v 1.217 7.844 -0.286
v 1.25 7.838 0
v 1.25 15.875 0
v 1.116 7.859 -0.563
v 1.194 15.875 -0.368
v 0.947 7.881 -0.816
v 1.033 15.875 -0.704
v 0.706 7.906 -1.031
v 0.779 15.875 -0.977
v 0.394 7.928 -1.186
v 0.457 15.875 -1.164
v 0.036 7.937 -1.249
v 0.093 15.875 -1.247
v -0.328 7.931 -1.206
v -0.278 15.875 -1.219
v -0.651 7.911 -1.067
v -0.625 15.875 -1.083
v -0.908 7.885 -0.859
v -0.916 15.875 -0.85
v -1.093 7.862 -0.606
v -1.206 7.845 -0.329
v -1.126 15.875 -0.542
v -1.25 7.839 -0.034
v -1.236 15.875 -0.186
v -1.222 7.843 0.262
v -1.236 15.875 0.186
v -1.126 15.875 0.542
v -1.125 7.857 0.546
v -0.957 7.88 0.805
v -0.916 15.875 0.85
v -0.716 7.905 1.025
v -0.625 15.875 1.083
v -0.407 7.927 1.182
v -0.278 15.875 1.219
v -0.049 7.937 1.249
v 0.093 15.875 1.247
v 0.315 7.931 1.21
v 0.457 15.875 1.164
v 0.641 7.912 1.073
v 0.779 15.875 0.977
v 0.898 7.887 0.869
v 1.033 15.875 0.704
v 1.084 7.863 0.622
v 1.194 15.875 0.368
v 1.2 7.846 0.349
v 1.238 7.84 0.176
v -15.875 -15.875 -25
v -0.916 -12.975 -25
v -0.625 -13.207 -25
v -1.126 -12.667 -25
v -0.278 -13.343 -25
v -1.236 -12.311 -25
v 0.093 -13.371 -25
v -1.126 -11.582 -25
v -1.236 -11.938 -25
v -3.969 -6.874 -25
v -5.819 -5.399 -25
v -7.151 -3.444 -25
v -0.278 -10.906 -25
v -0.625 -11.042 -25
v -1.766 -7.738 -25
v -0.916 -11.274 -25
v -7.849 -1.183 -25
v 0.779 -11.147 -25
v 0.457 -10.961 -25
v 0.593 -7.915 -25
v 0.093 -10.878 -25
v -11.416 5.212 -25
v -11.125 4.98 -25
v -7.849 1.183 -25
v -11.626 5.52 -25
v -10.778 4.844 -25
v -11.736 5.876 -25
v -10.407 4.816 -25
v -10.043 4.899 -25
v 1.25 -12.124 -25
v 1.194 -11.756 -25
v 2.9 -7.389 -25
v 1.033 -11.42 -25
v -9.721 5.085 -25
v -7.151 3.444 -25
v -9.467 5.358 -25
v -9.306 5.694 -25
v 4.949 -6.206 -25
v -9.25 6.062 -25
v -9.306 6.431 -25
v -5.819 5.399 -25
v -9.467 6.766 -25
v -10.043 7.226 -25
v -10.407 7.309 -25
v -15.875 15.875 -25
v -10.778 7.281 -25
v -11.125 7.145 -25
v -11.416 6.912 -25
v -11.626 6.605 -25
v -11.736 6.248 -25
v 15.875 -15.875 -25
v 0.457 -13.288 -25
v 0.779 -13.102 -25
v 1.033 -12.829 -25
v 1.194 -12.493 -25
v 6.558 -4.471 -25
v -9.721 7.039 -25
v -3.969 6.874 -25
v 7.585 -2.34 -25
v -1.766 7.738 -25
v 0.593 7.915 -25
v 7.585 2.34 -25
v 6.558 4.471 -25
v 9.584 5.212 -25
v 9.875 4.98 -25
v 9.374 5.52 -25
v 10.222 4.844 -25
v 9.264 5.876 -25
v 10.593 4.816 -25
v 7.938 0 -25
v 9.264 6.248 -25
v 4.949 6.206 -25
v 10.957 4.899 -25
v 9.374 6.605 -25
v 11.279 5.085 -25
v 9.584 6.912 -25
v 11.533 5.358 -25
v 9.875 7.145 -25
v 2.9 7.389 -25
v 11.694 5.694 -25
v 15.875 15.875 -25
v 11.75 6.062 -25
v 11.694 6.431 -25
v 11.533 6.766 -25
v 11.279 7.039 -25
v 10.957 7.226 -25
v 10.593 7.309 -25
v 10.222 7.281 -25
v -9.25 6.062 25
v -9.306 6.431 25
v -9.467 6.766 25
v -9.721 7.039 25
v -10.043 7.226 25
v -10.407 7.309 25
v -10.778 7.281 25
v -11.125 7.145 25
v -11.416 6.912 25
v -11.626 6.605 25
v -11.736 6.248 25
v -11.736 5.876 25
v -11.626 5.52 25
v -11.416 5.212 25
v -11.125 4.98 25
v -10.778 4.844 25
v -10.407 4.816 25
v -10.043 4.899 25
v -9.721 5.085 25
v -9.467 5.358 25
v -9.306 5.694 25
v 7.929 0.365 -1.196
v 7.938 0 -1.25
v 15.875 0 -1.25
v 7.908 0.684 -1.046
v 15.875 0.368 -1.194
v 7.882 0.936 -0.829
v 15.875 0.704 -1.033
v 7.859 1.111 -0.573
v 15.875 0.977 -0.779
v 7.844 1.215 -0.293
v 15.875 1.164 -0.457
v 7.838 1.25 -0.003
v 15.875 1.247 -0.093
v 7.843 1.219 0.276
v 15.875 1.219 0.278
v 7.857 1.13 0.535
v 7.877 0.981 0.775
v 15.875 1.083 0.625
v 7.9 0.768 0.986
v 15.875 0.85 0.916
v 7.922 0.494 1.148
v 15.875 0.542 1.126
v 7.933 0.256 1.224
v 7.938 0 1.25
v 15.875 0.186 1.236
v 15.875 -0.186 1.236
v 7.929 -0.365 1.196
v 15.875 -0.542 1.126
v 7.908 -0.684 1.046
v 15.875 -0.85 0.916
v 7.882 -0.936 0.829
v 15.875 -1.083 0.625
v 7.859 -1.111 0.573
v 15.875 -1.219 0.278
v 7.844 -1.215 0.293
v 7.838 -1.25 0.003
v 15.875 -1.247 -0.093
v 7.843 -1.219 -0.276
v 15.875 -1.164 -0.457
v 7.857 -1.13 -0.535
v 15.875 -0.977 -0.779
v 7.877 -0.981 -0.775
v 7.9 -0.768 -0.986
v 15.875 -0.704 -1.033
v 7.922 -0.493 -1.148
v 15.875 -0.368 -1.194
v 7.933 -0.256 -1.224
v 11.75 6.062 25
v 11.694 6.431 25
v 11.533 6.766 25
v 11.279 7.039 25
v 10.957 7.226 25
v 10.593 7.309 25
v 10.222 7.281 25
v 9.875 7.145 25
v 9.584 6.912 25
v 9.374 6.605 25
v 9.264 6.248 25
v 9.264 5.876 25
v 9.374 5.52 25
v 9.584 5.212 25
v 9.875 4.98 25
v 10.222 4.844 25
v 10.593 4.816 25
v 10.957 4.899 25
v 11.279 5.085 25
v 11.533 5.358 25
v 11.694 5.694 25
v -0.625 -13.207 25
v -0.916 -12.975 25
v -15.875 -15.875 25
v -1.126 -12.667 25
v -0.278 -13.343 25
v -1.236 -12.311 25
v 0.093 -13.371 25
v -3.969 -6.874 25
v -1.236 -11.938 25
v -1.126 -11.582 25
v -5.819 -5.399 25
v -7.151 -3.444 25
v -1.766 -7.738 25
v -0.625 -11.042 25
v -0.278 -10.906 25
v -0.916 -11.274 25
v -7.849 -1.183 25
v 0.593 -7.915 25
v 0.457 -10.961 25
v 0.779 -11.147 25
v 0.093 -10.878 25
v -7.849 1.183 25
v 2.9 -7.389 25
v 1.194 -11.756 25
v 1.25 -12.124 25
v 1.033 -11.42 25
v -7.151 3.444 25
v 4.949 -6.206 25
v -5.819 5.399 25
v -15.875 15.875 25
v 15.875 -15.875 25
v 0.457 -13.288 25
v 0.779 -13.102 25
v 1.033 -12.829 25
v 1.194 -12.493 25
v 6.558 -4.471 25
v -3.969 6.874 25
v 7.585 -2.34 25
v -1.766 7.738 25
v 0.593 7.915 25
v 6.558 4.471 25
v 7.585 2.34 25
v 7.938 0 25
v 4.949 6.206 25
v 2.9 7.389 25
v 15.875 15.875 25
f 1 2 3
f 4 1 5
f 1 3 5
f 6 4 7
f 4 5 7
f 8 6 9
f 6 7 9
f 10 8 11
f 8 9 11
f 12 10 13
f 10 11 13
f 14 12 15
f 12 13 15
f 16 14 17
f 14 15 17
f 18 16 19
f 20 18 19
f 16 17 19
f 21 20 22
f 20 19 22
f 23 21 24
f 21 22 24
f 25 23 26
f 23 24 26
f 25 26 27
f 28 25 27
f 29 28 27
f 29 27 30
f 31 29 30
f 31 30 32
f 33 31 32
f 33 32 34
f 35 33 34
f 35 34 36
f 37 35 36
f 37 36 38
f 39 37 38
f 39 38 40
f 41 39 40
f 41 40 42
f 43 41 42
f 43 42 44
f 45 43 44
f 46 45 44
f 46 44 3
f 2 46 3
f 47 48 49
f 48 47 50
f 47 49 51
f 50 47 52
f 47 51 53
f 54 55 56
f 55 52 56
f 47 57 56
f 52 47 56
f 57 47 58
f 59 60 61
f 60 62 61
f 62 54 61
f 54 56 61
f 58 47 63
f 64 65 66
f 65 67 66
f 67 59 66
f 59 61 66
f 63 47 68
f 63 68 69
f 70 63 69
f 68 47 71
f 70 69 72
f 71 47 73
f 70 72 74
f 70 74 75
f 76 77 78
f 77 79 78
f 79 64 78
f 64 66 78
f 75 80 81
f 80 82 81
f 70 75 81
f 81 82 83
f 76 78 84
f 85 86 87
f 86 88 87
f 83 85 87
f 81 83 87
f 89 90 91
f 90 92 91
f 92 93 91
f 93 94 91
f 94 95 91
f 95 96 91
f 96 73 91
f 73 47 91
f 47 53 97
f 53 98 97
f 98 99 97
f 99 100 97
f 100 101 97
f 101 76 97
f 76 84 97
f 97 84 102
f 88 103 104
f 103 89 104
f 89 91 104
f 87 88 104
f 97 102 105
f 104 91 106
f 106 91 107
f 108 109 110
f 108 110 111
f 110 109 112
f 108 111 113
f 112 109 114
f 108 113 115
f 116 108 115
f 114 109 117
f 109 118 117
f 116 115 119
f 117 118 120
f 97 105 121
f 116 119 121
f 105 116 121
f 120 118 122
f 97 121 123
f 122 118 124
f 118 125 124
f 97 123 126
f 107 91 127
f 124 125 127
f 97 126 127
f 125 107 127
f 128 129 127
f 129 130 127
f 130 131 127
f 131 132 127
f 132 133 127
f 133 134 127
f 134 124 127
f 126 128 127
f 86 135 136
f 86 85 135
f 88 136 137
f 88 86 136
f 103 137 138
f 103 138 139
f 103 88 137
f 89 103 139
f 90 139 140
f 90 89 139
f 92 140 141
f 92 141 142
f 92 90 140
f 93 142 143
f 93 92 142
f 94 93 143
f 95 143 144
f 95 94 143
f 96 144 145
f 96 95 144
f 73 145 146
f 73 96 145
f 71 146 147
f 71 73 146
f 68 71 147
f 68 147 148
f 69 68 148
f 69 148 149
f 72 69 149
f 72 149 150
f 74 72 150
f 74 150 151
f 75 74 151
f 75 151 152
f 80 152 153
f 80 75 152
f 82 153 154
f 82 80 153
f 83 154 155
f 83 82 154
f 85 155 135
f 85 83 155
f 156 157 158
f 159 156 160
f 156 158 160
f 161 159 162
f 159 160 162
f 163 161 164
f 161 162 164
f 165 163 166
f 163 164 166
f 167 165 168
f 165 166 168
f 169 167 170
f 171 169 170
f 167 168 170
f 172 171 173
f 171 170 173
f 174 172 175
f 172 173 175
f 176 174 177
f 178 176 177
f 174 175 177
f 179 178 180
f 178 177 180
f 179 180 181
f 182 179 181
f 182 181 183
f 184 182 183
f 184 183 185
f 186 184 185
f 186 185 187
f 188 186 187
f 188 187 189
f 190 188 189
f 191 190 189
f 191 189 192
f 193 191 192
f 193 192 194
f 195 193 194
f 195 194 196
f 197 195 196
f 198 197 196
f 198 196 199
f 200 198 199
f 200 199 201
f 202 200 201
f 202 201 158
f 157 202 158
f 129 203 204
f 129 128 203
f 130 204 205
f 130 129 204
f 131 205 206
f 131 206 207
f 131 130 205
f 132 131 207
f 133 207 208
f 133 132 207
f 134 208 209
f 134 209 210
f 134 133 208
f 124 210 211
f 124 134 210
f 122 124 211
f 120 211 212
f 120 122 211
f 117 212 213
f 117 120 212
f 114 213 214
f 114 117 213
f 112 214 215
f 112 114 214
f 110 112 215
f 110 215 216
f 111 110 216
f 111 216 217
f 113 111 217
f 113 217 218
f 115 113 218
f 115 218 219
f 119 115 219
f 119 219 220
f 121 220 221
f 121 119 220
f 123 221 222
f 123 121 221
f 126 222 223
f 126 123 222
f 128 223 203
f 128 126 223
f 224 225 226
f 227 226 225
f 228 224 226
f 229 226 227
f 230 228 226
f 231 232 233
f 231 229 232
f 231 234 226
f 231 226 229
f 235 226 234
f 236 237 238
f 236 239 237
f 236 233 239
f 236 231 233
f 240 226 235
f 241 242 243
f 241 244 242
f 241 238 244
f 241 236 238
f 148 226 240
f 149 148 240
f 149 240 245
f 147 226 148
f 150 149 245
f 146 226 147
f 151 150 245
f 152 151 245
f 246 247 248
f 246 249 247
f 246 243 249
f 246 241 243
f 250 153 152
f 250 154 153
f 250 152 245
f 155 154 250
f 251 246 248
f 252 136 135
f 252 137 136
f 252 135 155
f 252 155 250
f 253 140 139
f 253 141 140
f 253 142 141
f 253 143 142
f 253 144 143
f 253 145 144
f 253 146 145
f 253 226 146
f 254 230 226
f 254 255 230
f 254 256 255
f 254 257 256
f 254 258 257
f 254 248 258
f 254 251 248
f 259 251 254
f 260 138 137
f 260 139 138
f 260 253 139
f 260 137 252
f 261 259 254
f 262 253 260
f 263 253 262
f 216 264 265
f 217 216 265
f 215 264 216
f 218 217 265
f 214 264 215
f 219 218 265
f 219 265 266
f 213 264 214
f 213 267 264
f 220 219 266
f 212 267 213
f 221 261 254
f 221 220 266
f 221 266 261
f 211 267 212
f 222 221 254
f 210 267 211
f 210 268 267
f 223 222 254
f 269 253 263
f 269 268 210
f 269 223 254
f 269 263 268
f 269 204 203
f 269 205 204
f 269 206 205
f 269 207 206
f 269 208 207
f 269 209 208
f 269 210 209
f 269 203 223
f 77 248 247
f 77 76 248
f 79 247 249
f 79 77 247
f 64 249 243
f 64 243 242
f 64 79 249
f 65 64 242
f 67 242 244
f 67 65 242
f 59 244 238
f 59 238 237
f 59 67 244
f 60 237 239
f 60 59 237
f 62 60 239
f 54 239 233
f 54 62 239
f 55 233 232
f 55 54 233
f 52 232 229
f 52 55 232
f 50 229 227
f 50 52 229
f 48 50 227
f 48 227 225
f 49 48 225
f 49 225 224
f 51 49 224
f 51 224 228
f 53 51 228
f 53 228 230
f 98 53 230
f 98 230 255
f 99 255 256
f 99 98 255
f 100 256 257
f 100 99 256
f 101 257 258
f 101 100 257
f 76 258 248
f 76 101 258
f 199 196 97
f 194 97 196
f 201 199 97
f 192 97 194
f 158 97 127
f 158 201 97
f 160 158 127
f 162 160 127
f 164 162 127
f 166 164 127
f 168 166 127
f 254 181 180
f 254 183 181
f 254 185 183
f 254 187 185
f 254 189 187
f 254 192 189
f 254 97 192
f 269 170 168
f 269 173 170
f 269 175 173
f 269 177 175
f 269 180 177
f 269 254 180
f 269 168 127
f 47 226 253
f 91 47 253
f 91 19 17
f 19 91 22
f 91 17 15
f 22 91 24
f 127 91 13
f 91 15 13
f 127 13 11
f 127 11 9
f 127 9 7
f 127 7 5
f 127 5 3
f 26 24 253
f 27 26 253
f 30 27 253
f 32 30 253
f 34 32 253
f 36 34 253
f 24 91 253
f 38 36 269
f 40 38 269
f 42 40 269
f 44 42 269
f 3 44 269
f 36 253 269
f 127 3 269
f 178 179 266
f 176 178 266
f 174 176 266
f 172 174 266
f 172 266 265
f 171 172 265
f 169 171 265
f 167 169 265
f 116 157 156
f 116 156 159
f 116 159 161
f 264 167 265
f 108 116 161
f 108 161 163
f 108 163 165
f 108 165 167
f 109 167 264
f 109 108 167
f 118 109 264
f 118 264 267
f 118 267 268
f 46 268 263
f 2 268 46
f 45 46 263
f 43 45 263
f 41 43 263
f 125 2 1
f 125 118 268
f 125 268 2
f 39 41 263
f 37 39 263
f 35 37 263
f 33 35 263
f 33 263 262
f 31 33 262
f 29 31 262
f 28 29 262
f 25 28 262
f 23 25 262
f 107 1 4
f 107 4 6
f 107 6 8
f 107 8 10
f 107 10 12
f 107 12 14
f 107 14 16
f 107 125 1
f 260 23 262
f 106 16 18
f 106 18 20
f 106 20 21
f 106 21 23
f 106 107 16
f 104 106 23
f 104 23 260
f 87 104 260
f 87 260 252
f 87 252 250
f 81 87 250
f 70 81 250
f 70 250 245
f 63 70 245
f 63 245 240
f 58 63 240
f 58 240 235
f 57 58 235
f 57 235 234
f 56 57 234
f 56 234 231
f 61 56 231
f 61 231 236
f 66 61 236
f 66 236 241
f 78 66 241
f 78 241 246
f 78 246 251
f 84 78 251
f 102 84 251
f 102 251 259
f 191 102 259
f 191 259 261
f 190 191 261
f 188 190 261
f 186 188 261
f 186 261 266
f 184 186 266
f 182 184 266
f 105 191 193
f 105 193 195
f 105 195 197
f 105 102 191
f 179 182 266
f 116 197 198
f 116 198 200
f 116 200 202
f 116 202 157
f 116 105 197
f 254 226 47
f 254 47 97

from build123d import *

# Parameters (mm, degrees)
SKETCH1_W                  = 31.75
SKETCH1_H                  = 31.75
SKETCH1_R                  = 7.9375
SKETCH1_R_2                = 1.25
BOSS_EXTRUDE1_DEPTH        = 25
M3X0_5_TAPPED_HOLE1_REACH  = 45.417
M3X0_5_TAPPED_HOLE1_BORE_R = 1.25
M3X0_5_TAPPED_HOLE2_REACH  = 45.417
M3X0_5_TAPPED_HOLE2_BORE_R = 1.25


with BuildPart() as part:
    # Sketch1 → Boss-Extrude1 (new, symmetric)
    with BuildSketch(Plane.XY):
        Rectangle(SKETCH1_W, SKETCH1_H)
        Circle(SKETCH1_R, mode=Mode.SUBTRACT)
        with Locations((-10.5, 6.062177826)):
            Circle(SKETCH1_R_2, mode=Mode.SUBTRACT)
        with Locations((10.5, 6.062177826)):
            Circle(SKETCH1_R_2, mode=Mode.SUBTRACT)
        with Locations((0, -12.124355653)):
            Circle(SKETCH1_R_2, mode=Mode.SUBTRACT)
    extrude(amount=BOSS_EXTRUDE1_DEPTH, both=True)

    # M3x0.5 Tapped Hole1 bore → M3x0.5 Tapped Hole1 (cut, up to next)
    with BuildSketch(Plane(origin=(0, 15.875, 0), x_dir=(1, 0, 0), z_dir=(0, 1, 0)), mode=Mode.PRIVATE) as m3x0_5_tapped_hole1_sk1:
        Circle(M3X0_5_TAPPED_HOLE1_BORE_R)
    m3x0_5_tapped_hole1_tool1 = extrude(m3x0_5_tapped_hole1_sk1.sketch, amount=-M3X0_5_TAPPED_HOLE1_REACH, mode=Mode.PRIVATE) & part.part
    add(m3x0_5_tapped_hole1_tool1.solids().sort_by_distance((0, 15.875, 0))[0], mode=Mode.SUBTRACT)

    # M3x0.5 Tapped Hole2 bore → M3x0.5 Tapped Hole2 (cut, up to next)
    with BuildSketch(Plane(origin=(15.875, 0, 0), x_dir=(0, 0, -1), z_dir=(1, 0, 0)), mode=Mode.PRIVATE) as m3x0_5_tapped_hole2_sk1:
        Circle(M3X0_5_TAPPED_HOLE2_BORE_R)
    m3x0_5_tapped_hole2_tool1 = extrude(m3x0_5_tapped_hole2_sk1.sketch, amount=-M3X0_5_TAPPED_HOLE2_REACH, mode=Mode.PRIVATE) & part.part
    add(m3x0_5_tapped_hole2_tool1.solids().sort_by_distance((15.875, 0, 0))[0], mode=Mode.SUBTRACT)


solid = part.part
